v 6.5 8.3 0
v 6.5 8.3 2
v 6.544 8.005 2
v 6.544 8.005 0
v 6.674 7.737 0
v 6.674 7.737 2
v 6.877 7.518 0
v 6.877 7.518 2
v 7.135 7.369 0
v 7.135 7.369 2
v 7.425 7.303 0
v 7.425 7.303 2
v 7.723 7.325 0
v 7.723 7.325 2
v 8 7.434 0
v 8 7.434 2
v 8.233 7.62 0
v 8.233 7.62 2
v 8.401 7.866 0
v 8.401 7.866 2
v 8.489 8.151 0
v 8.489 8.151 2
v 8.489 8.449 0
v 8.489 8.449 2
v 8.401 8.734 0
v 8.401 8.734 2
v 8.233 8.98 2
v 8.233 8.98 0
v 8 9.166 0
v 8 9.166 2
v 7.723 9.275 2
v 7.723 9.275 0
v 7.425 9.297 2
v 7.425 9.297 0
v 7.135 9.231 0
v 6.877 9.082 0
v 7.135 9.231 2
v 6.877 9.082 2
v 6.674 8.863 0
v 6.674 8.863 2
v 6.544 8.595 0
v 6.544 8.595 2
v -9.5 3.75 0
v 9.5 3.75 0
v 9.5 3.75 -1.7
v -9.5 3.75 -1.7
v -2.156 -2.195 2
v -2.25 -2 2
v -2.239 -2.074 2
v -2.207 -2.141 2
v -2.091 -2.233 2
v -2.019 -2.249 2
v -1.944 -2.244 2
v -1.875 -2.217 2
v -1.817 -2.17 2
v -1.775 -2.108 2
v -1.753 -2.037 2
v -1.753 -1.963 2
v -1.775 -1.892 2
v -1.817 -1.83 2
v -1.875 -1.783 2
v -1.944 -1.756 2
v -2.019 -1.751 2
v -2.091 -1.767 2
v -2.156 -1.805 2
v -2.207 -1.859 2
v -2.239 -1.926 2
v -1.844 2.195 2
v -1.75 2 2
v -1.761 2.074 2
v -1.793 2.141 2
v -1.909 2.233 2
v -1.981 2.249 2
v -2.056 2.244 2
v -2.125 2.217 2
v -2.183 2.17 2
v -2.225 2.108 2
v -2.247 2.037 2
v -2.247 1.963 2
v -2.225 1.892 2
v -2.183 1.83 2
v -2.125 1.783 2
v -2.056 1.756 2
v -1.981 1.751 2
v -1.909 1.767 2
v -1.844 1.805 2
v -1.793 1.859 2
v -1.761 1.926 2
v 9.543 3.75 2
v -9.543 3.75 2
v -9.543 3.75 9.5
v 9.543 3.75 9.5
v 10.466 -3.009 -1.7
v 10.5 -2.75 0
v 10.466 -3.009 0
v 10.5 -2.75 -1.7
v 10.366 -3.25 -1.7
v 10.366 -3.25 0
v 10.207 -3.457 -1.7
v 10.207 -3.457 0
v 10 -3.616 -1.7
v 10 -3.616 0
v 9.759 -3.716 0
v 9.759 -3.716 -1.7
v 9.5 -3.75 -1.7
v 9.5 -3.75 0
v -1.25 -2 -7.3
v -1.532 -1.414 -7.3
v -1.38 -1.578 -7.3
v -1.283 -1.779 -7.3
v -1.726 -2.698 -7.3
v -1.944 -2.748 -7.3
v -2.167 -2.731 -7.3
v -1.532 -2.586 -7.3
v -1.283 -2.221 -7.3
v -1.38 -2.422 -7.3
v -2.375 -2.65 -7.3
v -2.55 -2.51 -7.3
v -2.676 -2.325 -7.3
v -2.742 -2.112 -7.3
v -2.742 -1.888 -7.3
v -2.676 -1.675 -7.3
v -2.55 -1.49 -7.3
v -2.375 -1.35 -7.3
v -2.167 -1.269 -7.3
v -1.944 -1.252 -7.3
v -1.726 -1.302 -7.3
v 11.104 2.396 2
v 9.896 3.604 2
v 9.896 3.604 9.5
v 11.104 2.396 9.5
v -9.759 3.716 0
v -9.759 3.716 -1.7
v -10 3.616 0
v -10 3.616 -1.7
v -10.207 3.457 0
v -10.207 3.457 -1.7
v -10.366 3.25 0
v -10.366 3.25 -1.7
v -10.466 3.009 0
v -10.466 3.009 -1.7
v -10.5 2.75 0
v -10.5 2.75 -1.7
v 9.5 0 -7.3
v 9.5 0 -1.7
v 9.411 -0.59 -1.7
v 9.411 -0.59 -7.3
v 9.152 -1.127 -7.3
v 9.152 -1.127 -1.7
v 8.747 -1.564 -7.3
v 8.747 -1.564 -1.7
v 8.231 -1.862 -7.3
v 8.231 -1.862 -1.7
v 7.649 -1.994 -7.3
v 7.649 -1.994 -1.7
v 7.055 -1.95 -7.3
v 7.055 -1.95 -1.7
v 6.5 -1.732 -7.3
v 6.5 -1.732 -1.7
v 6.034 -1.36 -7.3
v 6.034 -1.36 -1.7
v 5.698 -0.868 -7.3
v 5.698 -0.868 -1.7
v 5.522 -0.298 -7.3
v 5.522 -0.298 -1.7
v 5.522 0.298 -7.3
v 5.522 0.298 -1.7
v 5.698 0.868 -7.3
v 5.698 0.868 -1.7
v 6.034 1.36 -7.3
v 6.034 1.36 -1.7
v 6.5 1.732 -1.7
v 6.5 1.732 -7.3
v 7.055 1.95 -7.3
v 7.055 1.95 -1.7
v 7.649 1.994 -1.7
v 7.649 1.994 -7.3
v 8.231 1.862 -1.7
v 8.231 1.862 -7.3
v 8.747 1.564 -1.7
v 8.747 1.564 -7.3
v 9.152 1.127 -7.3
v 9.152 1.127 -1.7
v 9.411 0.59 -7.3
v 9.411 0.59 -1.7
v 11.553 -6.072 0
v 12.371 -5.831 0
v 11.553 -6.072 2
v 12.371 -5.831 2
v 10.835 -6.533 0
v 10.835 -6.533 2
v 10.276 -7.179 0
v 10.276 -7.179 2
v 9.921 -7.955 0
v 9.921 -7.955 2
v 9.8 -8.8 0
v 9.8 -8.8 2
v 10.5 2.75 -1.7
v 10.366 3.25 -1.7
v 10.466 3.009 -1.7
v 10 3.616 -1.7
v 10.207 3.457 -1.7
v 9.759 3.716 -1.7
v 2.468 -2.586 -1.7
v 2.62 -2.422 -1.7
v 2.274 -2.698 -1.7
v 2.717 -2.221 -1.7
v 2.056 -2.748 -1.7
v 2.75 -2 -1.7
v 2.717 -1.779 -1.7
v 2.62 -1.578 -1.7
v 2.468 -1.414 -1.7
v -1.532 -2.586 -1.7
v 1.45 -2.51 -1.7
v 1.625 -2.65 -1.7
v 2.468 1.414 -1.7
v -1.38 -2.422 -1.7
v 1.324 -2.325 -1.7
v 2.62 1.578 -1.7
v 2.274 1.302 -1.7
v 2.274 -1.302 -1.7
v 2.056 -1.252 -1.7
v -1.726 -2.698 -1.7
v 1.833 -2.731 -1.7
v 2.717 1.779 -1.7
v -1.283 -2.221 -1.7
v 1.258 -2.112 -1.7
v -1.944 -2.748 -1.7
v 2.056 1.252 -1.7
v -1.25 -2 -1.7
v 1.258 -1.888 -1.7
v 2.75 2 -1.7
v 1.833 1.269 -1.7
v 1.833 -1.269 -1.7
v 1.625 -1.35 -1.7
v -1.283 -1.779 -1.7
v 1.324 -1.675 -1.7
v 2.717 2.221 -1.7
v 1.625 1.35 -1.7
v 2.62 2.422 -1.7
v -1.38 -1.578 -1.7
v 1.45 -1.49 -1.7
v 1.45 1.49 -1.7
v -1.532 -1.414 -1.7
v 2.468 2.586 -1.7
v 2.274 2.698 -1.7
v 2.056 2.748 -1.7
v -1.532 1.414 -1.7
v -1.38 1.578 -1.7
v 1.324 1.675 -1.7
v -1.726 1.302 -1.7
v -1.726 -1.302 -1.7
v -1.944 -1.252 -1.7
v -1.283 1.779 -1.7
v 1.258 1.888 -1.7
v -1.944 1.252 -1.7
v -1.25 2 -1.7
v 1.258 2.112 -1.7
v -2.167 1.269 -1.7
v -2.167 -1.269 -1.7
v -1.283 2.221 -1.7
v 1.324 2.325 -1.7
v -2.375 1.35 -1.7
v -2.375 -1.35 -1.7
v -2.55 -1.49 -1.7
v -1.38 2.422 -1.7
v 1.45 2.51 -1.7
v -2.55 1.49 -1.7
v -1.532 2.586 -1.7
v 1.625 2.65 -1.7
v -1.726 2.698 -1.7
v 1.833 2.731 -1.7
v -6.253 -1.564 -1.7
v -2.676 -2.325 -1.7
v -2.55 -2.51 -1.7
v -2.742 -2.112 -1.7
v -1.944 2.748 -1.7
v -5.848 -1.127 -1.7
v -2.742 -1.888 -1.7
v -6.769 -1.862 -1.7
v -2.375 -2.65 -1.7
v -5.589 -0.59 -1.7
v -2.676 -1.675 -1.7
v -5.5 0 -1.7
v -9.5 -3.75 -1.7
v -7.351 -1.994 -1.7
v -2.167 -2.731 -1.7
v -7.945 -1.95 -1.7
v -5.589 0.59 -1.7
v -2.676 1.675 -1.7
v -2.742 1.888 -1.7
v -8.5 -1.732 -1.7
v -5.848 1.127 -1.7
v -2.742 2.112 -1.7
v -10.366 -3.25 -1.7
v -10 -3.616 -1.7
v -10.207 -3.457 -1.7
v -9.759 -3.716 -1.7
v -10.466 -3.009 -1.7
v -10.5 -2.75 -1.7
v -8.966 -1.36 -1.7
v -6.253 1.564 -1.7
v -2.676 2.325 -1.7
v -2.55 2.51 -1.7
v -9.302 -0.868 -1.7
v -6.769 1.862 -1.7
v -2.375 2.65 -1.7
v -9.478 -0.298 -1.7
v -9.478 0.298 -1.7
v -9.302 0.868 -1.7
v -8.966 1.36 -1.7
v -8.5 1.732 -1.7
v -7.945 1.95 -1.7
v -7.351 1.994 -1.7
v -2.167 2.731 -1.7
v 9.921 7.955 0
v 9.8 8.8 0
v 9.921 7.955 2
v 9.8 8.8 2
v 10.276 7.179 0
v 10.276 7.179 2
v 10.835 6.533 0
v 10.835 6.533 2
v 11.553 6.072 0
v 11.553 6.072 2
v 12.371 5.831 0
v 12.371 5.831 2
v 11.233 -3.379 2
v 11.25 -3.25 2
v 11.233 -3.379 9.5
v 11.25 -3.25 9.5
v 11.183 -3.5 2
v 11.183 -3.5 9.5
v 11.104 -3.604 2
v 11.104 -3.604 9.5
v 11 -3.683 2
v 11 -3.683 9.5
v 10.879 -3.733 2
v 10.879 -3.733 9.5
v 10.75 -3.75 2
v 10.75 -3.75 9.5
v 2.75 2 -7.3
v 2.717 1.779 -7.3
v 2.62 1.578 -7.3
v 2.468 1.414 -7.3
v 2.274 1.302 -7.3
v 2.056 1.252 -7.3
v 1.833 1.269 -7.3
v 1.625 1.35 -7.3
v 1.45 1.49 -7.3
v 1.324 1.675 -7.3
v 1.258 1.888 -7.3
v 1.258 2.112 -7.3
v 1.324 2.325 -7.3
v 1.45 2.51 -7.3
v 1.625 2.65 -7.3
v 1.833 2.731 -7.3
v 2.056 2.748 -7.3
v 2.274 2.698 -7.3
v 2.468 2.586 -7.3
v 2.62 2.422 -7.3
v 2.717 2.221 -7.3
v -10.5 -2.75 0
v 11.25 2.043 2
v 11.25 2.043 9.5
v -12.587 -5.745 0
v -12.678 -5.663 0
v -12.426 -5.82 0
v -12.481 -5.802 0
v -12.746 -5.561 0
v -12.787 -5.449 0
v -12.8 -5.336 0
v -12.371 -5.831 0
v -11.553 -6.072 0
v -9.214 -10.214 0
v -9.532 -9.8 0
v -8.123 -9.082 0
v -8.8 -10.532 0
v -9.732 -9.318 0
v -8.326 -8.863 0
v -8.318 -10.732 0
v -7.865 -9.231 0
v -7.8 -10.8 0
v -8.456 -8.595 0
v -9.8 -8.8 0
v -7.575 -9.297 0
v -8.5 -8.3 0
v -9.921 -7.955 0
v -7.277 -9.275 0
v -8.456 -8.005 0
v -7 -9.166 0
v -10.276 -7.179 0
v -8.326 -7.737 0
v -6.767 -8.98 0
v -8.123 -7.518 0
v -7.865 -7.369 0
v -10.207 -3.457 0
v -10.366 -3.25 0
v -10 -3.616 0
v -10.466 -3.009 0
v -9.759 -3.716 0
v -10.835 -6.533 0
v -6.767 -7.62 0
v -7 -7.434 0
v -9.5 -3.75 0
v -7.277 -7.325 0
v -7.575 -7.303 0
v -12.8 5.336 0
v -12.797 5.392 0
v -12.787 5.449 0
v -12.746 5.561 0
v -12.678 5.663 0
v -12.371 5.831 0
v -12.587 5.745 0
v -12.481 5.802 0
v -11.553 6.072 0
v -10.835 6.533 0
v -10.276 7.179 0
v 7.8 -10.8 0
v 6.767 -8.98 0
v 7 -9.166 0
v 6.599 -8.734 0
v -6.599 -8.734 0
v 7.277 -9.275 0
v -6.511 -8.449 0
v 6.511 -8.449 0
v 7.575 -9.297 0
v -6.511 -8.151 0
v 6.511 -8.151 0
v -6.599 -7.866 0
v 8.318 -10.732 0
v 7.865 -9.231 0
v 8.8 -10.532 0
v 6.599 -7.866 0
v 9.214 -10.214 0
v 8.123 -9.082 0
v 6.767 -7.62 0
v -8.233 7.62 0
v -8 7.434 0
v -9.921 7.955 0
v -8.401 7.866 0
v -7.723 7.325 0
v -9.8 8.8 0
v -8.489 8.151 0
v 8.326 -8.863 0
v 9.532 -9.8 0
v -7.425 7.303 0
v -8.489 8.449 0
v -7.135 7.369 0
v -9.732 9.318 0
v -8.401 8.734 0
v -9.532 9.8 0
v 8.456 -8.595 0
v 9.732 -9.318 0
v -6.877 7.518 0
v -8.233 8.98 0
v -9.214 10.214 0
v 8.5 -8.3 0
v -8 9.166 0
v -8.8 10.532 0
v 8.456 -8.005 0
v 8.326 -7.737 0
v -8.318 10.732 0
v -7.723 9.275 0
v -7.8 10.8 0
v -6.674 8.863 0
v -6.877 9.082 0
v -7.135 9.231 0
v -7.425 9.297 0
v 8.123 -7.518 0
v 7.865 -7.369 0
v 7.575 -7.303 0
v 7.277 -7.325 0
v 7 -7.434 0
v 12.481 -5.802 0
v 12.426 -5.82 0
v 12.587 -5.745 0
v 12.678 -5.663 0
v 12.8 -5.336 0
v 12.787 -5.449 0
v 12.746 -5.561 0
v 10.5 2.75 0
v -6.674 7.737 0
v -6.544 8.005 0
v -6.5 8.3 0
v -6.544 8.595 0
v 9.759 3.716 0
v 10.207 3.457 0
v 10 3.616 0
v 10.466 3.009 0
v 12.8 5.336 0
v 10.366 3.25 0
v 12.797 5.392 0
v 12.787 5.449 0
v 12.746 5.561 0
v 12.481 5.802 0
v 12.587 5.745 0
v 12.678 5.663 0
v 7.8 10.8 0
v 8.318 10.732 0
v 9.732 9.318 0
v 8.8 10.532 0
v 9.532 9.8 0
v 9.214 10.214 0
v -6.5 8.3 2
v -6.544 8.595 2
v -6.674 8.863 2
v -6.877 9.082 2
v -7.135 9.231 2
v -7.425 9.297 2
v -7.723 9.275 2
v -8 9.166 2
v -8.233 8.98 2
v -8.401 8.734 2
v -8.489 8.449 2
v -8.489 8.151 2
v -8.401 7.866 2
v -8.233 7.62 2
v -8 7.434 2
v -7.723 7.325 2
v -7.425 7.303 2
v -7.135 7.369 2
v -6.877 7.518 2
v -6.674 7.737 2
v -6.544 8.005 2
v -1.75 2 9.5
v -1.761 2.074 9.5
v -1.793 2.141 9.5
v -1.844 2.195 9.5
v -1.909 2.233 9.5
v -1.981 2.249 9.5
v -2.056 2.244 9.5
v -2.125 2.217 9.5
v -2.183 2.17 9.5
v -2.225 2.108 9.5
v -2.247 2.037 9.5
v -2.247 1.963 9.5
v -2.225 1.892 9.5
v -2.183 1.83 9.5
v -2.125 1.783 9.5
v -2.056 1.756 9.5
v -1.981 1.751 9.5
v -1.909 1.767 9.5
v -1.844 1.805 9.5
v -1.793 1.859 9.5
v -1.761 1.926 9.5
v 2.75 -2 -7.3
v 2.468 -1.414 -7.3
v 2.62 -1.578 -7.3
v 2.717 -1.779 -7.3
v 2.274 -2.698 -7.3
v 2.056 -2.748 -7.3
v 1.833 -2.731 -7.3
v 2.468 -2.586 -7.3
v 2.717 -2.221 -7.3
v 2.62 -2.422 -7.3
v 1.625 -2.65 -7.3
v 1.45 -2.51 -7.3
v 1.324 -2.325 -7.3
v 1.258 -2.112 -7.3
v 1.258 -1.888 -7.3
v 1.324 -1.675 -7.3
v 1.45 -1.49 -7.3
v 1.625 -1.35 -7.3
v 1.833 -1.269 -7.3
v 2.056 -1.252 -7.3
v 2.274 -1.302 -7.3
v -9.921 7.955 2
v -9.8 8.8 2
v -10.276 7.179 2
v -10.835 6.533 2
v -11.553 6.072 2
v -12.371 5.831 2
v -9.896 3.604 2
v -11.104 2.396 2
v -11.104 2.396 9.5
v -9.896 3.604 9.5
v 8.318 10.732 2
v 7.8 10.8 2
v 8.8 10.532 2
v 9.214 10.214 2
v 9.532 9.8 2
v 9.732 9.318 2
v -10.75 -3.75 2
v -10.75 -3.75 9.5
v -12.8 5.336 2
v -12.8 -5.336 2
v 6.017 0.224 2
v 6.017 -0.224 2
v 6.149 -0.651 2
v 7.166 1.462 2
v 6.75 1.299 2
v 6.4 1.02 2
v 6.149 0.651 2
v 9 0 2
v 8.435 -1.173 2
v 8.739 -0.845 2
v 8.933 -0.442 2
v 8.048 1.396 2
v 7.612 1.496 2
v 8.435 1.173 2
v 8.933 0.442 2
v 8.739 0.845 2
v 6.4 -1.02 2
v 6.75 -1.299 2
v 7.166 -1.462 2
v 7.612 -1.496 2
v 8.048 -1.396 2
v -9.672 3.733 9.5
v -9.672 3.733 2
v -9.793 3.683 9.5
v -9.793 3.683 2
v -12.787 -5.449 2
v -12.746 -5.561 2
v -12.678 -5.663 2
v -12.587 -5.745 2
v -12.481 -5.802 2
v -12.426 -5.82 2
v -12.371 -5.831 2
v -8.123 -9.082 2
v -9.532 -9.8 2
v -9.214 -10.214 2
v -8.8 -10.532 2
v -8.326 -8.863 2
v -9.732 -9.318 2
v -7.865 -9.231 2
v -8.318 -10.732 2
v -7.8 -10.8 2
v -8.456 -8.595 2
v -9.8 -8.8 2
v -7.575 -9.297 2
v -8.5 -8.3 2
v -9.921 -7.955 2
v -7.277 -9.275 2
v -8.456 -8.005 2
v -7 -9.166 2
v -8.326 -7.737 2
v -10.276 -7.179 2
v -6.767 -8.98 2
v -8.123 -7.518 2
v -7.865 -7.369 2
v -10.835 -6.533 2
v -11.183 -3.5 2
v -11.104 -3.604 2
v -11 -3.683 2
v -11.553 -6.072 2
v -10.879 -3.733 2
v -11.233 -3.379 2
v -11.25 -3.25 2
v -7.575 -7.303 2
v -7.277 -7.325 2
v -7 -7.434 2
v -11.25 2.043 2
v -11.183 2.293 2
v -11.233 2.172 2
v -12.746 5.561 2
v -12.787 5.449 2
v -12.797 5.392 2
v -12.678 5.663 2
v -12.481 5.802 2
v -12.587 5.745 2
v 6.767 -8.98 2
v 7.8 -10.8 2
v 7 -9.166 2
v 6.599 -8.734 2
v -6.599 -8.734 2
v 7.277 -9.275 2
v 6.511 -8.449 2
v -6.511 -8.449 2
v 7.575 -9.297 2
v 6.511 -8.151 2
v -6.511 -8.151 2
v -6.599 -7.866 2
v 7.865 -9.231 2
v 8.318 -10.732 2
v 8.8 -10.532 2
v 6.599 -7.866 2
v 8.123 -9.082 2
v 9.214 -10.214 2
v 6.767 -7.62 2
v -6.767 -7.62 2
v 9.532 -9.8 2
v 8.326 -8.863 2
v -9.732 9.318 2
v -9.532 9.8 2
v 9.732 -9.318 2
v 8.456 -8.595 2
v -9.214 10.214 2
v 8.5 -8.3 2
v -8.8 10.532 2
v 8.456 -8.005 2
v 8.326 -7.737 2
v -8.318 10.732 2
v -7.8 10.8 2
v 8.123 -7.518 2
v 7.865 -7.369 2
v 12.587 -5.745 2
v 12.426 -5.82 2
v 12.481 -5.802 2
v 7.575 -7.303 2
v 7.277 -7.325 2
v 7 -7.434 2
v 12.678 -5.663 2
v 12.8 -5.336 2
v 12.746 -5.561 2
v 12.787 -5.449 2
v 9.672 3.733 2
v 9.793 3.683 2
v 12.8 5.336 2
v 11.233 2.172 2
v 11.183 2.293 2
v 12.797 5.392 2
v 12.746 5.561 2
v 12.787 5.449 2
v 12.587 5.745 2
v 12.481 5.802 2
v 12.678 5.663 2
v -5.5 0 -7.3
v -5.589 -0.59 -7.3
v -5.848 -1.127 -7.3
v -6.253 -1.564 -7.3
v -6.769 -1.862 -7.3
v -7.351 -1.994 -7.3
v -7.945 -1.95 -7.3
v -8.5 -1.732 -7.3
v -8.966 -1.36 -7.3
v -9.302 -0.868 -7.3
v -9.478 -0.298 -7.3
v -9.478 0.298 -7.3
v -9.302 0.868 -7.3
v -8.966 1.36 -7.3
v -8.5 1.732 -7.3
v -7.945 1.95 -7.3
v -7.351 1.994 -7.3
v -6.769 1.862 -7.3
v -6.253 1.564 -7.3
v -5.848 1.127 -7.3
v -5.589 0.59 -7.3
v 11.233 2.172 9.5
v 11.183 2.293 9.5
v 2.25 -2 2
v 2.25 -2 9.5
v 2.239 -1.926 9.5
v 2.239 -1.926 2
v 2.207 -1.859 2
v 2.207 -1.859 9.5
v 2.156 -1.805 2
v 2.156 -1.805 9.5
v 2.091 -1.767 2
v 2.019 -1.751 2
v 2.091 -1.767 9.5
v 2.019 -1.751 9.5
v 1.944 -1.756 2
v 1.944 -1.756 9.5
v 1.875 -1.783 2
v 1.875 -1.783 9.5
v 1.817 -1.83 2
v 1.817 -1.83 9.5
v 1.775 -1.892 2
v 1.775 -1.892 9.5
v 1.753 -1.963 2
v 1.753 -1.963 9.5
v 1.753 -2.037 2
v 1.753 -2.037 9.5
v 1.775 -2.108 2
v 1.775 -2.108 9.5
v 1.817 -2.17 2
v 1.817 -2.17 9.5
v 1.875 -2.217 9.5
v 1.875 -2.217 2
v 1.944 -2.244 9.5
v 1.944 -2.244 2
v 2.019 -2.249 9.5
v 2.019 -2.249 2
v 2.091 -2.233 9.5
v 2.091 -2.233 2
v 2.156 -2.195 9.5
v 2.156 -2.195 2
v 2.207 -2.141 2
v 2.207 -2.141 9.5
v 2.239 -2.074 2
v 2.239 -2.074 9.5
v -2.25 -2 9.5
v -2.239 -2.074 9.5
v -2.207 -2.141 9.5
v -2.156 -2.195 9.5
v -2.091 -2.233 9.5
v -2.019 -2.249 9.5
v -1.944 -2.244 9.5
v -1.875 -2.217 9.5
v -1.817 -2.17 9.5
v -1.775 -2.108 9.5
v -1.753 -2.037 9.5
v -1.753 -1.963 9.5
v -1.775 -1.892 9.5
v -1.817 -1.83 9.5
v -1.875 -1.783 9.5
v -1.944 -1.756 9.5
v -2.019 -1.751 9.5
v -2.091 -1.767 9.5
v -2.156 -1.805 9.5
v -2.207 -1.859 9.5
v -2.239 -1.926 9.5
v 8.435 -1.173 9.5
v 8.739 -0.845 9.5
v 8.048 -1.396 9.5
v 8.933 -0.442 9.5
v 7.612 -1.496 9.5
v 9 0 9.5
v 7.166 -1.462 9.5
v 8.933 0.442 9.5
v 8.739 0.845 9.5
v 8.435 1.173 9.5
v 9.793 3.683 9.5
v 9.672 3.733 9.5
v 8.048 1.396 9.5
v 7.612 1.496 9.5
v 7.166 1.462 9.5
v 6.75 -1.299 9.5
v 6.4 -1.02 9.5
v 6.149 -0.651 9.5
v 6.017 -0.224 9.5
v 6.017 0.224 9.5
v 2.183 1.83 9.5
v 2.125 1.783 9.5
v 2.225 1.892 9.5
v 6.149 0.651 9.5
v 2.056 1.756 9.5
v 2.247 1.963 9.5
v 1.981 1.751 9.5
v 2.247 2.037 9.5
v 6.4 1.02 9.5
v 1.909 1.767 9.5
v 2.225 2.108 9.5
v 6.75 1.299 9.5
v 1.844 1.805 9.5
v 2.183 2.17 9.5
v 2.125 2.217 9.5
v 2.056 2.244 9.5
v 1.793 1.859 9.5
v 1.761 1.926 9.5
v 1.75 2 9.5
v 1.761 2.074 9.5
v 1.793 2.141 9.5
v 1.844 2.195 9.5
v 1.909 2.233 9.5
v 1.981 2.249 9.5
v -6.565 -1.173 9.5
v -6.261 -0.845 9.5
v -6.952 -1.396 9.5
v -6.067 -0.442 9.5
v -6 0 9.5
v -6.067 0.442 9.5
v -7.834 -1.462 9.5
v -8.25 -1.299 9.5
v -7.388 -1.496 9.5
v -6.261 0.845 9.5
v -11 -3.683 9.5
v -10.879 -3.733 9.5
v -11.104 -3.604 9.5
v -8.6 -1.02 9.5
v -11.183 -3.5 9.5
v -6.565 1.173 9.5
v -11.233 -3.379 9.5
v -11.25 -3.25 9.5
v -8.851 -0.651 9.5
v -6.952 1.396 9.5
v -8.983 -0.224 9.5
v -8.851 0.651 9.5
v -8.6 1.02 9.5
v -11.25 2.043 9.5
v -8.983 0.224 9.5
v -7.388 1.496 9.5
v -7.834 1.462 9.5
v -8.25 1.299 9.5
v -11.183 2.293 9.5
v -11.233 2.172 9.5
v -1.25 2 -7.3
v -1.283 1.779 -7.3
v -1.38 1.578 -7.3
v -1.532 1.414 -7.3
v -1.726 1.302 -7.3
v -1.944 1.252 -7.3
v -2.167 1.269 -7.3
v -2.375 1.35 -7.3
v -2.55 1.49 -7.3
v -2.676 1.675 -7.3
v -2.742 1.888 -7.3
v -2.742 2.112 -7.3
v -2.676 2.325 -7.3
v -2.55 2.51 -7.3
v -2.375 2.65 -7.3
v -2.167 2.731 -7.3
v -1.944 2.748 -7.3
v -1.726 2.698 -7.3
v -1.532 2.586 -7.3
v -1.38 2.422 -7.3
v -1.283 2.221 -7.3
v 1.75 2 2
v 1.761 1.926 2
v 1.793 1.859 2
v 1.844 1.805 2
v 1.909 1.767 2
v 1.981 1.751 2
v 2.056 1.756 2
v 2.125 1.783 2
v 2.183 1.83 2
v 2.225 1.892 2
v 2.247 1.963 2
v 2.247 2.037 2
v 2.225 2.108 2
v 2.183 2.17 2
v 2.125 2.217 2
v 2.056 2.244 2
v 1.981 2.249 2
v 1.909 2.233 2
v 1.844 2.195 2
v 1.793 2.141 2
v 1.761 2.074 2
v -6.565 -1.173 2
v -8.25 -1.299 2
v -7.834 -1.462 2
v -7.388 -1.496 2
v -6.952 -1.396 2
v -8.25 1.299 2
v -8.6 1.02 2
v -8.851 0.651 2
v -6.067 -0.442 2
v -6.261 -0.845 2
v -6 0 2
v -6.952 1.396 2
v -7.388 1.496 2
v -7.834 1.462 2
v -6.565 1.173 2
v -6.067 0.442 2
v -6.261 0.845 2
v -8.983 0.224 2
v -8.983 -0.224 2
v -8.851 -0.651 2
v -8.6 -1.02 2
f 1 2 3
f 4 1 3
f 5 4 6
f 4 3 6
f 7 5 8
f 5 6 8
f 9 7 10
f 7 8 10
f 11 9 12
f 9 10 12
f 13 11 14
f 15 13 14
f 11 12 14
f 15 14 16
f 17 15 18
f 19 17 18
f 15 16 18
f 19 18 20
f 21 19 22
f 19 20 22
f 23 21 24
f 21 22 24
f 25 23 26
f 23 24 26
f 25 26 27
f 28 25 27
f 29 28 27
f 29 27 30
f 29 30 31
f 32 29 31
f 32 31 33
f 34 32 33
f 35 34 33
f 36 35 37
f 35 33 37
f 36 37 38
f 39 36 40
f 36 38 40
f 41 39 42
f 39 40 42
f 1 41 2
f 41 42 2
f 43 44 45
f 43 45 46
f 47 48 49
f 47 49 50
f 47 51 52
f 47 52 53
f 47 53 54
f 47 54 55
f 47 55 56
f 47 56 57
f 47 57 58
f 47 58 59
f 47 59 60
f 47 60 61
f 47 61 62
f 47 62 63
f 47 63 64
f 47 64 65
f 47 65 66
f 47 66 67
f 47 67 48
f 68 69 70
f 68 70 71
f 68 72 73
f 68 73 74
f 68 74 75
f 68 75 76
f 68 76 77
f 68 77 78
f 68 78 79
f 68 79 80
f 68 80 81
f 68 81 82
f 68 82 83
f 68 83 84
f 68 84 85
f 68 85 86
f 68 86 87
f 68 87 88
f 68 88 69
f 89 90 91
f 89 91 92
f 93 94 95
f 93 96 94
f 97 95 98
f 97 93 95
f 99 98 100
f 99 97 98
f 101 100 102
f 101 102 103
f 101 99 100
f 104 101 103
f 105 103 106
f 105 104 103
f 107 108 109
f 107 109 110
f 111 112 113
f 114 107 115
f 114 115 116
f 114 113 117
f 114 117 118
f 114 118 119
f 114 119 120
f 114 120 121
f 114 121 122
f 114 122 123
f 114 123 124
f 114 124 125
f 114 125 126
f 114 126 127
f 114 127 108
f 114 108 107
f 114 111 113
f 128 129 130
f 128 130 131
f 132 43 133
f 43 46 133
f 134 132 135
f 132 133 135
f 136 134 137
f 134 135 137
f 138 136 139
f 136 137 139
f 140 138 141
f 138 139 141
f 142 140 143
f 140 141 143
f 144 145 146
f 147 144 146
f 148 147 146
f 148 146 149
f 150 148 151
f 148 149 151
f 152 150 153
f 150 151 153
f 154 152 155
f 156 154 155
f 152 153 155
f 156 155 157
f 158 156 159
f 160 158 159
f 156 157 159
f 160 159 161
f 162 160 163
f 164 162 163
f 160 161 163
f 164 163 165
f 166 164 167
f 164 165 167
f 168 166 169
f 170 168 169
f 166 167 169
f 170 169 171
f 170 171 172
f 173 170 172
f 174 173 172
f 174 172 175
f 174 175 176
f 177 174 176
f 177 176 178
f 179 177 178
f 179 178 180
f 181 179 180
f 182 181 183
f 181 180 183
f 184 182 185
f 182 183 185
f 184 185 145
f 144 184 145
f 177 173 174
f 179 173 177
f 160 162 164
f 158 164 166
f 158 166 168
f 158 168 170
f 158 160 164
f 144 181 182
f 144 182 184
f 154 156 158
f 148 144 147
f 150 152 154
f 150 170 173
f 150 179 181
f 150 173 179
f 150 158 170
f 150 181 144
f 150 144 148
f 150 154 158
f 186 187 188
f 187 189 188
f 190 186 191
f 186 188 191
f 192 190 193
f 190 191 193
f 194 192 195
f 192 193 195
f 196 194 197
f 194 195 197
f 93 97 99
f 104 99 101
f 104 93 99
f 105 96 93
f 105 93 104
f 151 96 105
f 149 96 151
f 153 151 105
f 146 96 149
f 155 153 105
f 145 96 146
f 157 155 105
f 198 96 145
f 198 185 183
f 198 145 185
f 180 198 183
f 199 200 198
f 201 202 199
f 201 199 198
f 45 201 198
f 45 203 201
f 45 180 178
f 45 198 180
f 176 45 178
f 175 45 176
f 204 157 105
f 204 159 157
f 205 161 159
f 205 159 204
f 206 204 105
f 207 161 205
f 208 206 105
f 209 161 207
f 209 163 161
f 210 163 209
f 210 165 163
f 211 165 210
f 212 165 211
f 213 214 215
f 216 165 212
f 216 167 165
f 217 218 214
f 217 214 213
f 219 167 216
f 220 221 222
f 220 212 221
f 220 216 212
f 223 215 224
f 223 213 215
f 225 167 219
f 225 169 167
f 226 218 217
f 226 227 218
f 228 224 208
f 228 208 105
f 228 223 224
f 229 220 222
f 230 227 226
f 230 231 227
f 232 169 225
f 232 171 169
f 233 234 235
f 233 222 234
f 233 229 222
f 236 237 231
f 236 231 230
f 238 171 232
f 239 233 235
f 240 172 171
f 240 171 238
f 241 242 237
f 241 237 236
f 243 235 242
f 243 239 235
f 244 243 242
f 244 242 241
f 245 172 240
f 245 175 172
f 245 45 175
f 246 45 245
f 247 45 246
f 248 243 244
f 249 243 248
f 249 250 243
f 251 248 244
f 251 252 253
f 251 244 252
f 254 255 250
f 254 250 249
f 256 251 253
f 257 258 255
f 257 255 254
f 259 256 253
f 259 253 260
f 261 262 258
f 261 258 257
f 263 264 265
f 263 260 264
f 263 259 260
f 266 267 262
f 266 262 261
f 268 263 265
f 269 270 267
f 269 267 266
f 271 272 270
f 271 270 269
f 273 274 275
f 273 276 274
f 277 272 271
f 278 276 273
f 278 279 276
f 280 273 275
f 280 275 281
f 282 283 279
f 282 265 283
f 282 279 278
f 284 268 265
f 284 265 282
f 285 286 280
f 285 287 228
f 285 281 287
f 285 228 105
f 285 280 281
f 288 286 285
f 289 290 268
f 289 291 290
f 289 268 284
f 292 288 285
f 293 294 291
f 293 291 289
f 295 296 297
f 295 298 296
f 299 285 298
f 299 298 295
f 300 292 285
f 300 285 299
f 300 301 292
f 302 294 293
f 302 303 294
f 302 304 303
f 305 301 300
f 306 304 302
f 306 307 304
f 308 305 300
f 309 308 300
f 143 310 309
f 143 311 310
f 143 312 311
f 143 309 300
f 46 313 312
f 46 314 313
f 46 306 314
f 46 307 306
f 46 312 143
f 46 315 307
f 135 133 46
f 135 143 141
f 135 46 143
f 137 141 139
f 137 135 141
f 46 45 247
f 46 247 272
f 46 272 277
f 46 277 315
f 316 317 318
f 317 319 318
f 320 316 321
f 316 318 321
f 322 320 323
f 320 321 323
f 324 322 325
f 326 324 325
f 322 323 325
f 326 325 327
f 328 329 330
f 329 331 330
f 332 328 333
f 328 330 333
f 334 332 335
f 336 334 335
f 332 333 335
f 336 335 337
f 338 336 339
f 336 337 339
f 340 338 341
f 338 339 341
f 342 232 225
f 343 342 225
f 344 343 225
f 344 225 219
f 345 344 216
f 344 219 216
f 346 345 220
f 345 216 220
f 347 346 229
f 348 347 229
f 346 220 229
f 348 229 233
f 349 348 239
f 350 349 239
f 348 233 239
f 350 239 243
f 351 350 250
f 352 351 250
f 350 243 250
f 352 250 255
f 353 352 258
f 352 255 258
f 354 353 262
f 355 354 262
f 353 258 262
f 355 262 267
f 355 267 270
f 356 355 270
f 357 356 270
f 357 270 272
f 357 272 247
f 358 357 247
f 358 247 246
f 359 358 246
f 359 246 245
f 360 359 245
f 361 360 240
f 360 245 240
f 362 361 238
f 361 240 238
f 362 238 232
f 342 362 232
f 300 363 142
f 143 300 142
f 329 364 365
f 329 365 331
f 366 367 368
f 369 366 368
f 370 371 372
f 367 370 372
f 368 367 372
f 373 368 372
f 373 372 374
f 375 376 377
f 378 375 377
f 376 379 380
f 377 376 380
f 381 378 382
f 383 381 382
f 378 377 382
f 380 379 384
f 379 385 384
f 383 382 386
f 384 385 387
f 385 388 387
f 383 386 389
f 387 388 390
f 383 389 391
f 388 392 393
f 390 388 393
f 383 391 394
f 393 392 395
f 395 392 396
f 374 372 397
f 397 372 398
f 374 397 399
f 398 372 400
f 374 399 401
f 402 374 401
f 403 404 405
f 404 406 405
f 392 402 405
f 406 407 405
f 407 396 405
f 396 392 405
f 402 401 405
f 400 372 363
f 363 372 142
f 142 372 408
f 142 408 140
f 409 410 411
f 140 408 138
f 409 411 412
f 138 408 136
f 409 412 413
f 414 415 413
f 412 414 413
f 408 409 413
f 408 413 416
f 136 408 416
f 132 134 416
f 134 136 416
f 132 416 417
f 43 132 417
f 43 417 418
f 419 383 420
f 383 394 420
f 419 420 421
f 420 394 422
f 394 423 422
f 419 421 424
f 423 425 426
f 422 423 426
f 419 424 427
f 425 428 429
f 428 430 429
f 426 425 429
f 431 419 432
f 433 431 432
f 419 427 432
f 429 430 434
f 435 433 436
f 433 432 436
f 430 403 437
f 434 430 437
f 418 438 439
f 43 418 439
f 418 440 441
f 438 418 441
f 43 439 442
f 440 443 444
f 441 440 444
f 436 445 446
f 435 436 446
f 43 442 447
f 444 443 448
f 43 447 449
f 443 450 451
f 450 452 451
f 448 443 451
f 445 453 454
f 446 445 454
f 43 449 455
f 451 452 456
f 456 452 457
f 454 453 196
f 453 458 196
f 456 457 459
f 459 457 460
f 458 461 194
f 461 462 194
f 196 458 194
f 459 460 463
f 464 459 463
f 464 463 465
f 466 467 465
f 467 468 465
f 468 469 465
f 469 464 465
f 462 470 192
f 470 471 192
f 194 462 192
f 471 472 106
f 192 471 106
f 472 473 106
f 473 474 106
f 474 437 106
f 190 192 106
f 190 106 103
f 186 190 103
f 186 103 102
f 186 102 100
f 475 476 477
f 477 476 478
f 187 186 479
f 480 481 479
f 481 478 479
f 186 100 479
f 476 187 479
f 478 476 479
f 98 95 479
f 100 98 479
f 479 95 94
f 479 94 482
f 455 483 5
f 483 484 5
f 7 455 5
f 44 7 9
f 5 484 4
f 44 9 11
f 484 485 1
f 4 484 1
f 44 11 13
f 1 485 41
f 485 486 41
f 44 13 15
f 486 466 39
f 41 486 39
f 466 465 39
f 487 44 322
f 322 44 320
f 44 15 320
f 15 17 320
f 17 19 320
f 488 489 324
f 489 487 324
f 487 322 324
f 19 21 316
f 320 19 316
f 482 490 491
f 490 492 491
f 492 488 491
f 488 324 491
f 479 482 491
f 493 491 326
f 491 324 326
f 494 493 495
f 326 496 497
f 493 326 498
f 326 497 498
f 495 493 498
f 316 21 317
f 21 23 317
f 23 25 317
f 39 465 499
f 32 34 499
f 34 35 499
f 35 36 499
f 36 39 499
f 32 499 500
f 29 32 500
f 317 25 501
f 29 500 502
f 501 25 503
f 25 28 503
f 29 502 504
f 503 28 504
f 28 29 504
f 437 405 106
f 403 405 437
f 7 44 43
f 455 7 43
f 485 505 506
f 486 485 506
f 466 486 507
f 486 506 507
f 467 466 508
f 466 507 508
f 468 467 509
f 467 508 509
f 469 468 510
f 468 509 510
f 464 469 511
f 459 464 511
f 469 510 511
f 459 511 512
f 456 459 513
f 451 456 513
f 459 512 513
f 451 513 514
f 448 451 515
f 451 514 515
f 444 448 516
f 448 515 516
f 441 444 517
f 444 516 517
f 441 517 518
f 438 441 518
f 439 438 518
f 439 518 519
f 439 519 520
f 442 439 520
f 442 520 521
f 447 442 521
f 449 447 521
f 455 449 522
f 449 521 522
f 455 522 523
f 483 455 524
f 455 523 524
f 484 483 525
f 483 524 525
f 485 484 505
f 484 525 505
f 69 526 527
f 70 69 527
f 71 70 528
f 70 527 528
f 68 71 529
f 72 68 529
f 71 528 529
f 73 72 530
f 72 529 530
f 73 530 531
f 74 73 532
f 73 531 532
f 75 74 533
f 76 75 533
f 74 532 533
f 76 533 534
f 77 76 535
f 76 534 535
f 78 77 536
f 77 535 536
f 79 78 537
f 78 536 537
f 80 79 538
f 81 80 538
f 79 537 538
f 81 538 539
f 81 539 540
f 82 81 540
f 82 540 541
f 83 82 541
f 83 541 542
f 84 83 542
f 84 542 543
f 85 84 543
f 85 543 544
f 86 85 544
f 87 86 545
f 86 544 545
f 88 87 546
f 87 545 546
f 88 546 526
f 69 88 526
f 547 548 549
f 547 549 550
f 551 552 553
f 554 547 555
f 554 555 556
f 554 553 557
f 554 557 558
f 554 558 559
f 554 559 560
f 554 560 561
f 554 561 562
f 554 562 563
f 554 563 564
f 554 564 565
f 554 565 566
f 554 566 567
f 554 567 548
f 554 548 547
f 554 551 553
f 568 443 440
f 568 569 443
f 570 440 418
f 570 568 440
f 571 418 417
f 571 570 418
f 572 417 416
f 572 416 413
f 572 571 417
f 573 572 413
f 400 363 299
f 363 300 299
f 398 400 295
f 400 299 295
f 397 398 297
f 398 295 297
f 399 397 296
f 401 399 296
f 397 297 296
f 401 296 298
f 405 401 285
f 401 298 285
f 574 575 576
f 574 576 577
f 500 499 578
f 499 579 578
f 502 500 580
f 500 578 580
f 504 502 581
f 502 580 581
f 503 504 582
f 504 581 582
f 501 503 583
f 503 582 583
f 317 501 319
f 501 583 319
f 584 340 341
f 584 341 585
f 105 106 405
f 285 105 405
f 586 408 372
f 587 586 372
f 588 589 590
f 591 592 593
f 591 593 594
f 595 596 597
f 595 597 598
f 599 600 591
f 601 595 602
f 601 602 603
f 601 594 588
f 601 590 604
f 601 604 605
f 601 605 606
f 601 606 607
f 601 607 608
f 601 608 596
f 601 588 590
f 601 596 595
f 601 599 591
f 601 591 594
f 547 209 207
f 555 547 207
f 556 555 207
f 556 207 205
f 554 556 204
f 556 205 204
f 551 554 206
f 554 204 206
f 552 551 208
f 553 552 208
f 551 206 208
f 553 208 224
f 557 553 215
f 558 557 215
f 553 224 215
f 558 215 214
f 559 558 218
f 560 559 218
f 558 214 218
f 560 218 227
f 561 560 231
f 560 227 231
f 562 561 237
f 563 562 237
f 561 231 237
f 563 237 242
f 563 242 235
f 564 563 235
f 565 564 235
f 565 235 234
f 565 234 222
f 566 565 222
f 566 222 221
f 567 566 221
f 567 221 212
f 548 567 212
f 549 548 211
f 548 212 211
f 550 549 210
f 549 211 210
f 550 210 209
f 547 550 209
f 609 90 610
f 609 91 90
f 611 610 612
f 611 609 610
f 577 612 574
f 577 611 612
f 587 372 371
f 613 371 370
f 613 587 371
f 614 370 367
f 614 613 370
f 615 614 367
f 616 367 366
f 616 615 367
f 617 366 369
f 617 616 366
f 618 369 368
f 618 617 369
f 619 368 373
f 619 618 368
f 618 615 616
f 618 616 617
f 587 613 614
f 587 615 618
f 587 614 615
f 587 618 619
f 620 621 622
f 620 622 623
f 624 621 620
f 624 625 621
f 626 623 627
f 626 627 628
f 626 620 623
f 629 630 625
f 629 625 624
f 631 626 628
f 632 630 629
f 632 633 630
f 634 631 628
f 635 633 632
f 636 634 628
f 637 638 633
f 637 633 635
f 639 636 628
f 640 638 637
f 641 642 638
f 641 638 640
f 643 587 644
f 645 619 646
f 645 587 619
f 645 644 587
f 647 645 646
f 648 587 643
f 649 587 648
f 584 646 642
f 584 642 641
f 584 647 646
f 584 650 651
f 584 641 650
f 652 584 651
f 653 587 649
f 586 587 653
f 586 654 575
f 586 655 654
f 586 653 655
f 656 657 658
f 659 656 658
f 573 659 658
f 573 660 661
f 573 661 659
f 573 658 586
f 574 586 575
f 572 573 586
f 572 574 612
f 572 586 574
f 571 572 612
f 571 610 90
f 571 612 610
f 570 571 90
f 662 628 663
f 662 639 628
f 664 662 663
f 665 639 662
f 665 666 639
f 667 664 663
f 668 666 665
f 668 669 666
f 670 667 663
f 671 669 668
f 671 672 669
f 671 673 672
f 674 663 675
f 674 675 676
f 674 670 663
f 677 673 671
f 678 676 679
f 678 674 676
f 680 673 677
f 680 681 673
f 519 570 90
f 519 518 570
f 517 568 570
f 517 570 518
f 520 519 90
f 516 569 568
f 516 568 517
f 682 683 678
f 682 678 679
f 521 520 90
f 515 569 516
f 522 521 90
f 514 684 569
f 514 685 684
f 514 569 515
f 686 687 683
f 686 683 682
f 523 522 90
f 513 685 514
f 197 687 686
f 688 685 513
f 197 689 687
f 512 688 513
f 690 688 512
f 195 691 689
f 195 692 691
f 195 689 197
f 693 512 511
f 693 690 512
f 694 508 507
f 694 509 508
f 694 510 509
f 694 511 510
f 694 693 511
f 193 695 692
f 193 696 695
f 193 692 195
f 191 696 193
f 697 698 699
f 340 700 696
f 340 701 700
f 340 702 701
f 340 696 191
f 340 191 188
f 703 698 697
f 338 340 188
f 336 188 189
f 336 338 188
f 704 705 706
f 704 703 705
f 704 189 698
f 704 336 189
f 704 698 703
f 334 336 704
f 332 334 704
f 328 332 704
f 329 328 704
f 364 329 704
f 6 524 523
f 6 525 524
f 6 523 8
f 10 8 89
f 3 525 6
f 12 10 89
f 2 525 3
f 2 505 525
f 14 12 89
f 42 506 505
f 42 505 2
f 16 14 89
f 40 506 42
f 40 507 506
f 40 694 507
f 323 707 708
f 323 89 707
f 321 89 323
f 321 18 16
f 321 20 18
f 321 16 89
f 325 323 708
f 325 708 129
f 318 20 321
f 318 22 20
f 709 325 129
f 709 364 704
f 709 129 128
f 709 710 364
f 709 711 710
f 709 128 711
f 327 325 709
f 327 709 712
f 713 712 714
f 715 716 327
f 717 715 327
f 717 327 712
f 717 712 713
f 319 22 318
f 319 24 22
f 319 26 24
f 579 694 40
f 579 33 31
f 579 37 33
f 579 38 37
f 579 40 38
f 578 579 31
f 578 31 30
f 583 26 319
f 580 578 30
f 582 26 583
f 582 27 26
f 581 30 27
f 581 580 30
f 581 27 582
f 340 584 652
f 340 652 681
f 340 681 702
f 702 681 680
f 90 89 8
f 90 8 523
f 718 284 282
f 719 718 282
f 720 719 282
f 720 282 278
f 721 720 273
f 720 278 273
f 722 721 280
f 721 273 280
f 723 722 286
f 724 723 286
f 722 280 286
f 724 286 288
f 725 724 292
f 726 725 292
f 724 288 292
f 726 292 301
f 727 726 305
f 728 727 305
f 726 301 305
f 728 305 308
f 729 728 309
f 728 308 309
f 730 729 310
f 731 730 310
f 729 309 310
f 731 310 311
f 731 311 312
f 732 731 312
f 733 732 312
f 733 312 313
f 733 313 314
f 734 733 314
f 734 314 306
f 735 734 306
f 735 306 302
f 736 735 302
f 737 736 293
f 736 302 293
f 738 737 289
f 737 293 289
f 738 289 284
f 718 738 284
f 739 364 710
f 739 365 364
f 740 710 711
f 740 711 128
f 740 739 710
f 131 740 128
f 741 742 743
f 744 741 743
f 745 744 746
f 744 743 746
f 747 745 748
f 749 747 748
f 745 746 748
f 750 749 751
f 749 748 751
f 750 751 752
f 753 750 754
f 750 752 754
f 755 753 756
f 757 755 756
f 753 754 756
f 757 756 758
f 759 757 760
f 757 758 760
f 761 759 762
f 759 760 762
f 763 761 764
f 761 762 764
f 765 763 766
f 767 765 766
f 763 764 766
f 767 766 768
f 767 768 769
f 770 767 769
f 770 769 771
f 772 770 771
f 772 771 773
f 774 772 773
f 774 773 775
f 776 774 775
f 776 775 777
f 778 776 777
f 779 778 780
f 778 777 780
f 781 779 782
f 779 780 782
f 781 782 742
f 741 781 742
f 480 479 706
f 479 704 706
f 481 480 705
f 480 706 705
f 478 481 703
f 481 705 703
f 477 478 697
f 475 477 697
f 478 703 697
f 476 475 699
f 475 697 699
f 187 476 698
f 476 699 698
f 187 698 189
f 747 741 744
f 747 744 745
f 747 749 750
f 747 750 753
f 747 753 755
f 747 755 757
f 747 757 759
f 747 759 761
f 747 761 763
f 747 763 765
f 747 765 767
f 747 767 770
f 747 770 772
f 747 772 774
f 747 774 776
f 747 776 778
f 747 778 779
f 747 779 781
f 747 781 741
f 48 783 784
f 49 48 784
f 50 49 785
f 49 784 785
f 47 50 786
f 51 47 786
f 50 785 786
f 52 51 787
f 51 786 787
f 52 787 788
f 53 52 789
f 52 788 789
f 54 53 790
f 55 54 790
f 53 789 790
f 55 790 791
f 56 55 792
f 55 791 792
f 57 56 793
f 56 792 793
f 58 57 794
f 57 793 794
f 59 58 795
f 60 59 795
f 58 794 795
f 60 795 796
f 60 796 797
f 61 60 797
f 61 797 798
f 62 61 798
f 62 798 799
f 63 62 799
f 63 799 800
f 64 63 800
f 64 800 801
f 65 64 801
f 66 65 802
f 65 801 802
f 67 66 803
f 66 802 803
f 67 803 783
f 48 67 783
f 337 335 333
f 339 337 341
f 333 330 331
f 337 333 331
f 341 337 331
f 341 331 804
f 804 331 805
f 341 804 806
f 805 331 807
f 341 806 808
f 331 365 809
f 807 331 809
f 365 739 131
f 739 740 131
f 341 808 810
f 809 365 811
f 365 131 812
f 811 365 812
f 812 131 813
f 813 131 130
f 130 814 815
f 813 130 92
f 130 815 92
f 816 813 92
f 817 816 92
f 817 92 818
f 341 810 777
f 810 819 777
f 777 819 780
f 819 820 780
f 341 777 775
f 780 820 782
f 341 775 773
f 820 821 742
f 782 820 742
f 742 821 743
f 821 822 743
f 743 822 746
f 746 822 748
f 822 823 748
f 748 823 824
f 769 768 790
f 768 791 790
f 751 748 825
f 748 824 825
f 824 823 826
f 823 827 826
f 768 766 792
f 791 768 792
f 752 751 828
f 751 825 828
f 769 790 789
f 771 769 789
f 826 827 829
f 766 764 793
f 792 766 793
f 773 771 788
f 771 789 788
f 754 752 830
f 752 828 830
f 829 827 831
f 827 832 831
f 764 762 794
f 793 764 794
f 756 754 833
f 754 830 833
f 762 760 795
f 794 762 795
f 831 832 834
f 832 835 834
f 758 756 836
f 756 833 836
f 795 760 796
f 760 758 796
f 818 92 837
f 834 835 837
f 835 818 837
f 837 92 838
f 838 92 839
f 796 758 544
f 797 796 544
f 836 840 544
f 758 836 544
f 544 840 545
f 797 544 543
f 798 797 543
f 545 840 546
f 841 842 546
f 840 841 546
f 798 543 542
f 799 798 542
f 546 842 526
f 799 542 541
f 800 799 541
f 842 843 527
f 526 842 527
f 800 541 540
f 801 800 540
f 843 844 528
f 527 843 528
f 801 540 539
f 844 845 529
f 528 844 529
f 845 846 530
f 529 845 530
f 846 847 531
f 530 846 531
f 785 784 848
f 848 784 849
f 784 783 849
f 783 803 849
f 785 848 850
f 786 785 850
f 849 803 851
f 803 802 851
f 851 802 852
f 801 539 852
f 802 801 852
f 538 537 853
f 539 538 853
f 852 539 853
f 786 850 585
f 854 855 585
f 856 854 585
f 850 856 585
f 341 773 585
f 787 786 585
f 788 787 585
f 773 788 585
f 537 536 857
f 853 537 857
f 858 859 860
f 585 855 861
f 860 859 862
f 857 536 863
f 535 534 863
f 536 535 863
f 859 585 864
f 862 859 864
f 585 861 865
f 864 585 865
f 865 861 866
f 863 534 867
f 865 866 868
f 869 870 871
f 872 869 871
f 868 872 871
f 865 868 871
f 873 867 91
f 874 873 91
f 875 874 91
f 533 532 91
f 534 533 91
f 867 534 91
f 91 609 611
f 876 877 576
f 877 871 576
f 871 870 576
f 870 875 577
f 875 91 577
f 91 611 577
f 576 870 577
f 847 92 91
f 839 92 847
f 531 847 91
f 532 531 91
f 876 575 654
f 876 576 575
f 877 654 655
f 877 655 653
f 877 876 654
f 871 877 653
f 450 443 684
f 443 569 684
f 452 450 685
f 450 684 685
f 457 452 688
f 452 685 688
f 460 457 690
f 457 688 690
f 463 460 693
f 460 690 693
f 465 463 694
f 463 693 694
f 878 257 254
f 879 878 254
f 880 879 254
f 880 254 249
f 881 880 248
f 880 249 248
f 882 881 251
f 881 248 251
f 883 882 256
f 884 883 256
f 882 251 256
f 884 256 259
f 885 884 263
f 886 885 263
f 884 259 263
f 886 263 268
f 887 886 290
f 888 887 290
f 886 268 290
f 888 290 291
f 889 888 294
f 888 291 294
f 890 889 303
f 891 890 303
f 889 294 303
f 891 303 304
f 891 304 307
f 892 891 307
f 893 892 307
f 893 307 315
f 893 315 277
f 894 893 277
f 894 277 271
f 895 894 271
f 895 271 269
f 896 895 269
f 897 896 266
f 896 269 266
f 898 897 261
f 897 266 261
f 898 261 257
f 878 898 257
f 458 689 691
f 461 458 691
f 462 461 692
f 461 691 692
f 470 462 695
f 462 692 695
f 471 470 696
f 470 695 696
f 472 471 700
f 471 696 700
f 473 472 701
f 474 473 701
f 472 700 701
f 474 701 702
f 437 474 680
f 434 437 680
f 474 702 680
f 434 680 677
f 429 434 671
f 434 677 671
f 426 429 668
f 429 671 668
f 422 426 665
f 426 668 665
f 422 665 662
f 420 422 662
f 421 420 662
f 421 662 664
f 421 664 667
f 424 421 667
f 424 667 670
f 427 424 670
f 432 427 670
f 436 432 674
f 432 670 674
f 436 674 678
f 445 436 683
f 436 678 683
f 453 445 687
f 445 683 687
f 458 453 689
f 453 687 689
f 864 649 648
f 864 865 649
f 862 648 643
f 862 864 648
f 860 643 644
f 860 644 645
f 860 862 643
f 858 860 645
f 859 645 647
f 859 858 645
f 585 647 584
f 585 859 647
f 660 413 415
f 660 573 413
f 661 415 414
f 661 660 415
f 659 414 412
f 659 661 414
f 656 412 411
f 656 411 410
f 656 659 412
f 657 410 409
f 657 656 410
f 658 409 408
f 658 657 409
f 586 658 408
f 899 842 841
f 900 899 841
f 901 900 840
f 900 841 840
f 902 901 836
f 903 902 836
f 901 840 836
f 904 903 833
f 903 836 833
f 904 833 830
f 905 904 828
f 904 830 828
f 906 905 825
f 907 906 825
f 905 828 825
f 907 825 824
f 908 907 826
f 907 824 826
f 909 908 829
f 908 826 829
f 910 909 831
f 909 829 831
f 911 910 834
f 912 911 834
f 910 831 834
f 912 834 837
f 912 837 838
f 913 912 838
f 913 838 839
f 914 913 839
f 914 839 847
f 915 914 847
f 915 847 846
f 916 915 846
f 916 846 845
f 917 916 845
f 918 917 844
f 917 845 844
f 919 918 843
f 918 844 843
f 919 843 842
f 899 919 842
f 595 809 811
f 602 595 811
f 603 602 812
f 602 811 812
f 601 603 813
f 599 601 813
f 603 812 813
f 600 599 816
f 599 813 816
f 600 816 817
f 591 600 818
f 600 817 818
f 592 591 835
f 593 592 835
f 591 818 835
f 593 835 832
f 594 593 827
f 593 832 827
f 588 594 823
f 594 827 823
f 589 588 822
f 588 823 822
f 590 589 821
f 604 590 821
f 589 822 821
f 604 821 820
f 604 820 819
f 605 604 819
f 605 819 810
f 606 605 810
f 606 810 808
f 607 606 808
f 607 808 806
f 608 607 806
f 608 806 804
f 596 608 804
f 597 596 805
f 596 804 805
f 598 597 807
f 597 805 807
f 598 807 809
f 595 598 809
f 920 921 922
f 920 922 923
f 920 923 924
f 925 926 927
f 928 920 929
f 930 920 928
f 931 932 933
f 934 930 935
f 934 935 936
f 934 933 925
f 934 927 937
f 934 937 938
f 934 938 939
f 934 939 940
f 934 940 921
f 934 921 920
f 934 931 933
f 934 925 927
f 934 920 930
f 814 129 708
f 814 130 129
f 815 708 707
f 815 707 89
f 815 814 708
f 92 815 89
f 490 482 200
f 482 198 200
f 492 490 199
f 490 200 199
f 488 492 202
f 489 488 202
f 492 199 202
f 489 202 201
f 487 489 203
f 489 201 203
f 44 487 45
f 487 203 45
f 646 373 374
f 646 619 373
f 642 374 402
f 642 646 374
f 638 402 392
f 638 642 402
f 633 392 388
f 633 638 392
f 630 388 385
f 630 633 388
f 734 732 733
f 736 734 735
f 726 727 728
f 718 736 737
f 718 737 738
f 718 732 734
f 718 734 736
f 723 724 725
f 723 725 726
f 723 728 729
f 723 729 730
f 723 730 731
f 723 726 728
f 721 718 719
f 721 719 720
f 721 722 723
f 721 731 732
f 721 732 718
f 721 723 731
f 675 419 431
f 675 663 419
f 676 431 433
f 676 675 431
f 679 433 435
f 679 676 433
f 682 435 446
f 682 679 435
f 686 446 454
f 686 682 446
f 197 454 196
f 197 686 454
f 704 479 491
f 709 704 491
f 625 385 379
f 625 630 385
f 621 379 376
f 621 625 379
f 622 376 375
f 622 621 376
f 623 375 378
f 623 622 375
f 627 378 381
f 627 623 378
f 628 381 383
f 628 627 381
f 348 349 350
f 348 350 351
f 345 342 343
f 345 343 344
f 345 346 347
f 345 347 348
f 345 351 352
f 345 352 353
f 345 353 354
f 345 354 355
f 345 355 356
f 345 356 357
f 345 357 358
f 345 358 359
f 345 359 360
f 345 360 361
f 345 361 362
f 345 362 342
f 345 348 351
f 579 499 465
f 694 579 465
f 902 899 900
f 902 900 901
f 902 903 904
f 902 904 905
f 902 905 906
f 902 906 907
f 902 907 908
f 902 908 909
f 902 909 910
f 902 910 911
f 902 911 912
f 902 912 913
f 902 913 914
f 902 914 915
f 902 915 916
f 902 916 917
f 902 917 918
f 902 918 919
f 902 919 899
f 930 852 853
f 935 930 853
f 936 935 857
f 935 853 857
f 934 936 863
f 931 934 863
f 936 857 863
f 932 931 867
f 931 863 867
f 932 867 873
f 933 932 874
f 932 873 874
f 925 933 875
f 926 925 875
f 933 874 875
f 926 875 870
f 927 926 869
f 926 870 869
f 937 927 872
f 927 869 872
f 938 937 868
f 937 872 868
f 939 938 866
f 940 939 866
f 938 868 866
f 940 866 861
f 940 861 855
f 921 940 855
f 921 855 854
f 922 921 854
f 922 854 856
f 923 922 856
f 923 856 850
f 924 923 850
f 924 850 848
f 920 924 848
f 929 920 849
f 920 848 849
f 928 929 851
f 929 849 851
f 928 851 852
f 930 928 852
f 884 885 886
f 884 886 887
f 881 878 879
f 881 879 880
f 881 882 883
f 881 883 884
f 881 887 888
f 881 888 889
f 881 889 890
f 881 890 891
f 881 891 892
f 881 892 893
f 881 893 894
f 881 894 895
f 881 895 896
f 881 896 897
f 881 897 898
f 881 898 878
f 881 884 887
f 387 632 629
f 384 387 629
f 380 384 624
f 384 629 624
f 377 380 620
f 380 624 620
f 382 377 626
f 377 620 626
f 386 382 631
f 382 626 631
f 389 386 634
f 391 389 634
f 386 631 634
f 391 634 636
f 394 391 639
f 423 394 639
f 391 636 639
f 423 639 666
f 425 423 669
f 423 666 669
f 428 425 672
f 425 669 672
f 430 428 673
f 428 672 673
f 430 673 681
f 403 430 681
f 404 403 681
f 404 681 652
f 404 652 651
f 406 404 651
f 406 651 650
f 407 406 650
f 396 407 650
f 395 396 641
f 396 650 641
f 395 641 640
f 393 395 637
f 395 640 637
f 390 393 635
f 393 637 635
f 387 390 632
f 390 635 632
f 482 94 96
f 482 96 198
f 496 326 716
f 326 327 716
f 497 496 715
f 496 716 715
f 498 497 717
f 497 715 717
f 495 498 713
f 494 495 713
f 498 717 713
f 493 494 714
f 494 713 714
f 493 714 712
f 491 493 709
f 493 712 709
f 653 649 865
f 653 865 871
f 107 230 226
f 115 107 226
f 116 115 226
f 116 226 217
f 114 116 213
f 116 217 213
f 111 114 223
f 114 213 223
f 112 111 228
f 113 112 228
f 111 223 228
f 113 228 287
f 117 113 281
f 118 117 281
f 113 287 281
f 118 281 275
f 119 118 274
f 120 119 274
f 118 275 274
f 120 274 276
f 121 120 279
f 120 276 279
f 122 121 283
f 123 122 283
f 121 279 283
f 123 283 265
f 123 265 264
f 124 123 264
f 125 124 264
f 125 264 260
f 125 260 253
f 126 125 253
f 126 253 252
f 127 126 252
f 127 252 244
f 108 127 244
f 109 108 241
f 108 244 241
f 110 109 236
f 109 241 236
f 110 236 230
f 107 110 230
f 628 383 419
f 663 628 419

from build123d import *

# Parameters (mm, degrees)
EXTRUDE_1_DEPTH     = 2
SKETCH_2_R          = 1
CUT_EXTRUDE_1_DEPTH = 2
EXTRUDE_2_DEPTH     = 7.5
SKETCH_4_R          = 1.5
SKETCH_4_R_2        = 0.25
CUT_EXTRUDE_2_DEPTH = 7.5
SKETCH_5_W          = 21
SKETCH_5_H          = 7.5
EXTRUDE_3_DEPTH     = 1.7
SKETCH_6_R          = 2
SKETCH_6_R_2        = 0.75
EXTRUDE_4_DEPTH     = 5.6
FILLET_1_R          = 2
FILLET_2_R          = 3
FILLET_3_R          = 1
FILLET_4_R          = 0.5


with BuildPart() as part:
    # 草图1 → 凸台-拉伸1 (new body)
    with BuildSketch(Plane.XY):
        Polygon((0, 10.8), (-9.8, 10.8), (-9.8, 5.8), (-12.8, 5.8), (-12.8, -5.8), (-9.8, -5.8), (-9.8, -10.8), (0, -10.8), (9.8, -10.8), (9.8, -5.8), (12.8, -5.8), (12.8, 5.8), (9.8, 5.8), (9.8, 10.8), align=None)
    extrude(amount=EXTRUDE_1_DEPTH)

    # 草图2 → 切除-拉伸1 (cut)
    with BuildSketch(Plane.XY.offset(2)):
        with Locations((-7.5, 8.3)):
            Circle(SKETCH_2_R)
        with Locations(Location((7.5, 8.3, 0), (0, 0, 180))):
            Circle(SKETCH_2_R)
        with Locations((7.5, -8.3)):
            Circle(SKETCH_2_R)
        with Locations(Location((-7.5, -8.3, 0), (0, 0, 180))):
            Circle(SKETCH_2_R)
    extrude(amount=-CUT_EXTRUDE_1_DEPTH, mode=Mode.SUBTRACT)

    # 草图3 → 凸台-拉伸2 (add)
    with BuildSketch(Plane.XY.offset(2)):
        Polygon((11.25, -3.75), (-11.25, -3.75), (-11.25, 2.25), (-9.75, 3.75), (9.75, 3.75), (11.25, 2.25), align=None)
    extrude(amount=EXTRUDE_2_DEPTH)

    # 草图4 → 切除-拉伸2 (cut)
    with BuildSketch(Plane.XY.offset(9.5)):
        with Locations((-7.5, 0)):
            Circle(SKETCH_4_R)
        with Locations((-2, 2)):
            Circle(SKETCH_4_R_2)
        with Locations(Location((2, 2, 0), (0, 0, 180))):
            Circle(SKETCH_4_R_2)
        with Locations((7.5, 0)):
            Circle(SKETCH_4_R)
        with Locations((2, -2)):
            Circle(SKETCH_4_R_2)
        with Locations(Location((-2, -2, 0), (0, 0, 180))):
            Circle(SKETCH_4_R_2)
    extrude(amount=-CUT_EXTRUDE_2_DEPTH, mode=Mode.SUBTRACT)

    # 草图5 → 凸台-拉伸3 (add)
    with BuildSketch(Plane(origin=(0, 0, 0), x_dir=(-1, 0, 0), z_dir=(0, 0, -1))):
        Rectangle(SKETCH_5_W, SKETCH_5_H)
    extrude(amount=EXTRUDE_3_DEPTH)

    # 草图6 → 凸台-拉伸4 (add)
    with BuildSketch(Plane(origin=(0, 0, -1.7), x_dir=(-1, 0, 0), z_dir=(0, 0, -1))):
        with Locations(Location((-7.5, 0, 0), (0, 0, 180))):
            Circle(SKETCH_6_R)
        with Locations(Location((-2, 2, 0), (0, 0, 180))):
            Circle(SKETCH_6_R_2)
        with Locations(Location((2, 2, 0), (0, 0, 180))):
            Circle(SKETCH_6_R_2)
        with Locations(Location((7.5, 0, 0), (0, 0, 180))):
            Circle(SKETCH_6_R)
        with Locations(Location((2, -2, 0), (0, 0, 180))):
            Circle(SKETCH_6_R_2)
        with Locations(Location((-2, -2, 0), (0, 0, 180))):
            Circle(SKETCH_6_R_2)
    extrude(amount=EXTRUDE_4_DEPTH)

    # 圆角1
    fillet_1_edges = [part.edges().sort_by_distance(p)[0] for p in [
        (9.8, 10.8, 1),
        (9.8, -10.8, 1),
        (-9.8, -10.8, 1),
        (-9.8, 10.8, 1),
    ]]
    fillet(fillet_1_edges, radius=FILLET_1_R)

    # 圆角2
    fillet_2_edges = [part.edges().sort_by_distance(p)[0] for p in [
        (-9.8, -5.8, 1),
        (9.8, -5.8, 1),
        (-9.8, 5.8, 1),
        (9.8, 5.8, 1),
    ]]
    fillet(fillet_2_edges, radius=FILLET_2_R - 0.0001)  # a hair under: the kernel refuses the full size

    # 圆角3
    fillet_3_edges = [part.edges().sort_by_distance(p)[0] for p in [
        (-10.5, -3.75, -0.85),
        (-10.5, 3.75, -0.85),
        (10.5, 3.75, -0.85),
        (10.5, -3.75, -0.85),
    ]]
    fillet(fillet_3_edges, radius=FILLET_3_R)

    # 圆角4
    fillet_4_edges = [part.edges().sort_by_distance(p)[0] for p in [
        (12.8, 5.8, 1),
        (12.8, -5.8, 1),
        (-12.8, -5.8, 1),
        (-12.8, 5.8, 1),
        (11.25, 2.25, 5.75),
        (9.75, 3.75, 5.75),
        (-9.75, 3.75, 5.75),
        (-11.25, 2.25, 5.75),
        (-11.25, -3.75, 5.75),
        (11.25, -3.75, 5.75),
    ]]
    fillet(fillet_4_edges, radius=FILLET_4_R)


solid = part.part
